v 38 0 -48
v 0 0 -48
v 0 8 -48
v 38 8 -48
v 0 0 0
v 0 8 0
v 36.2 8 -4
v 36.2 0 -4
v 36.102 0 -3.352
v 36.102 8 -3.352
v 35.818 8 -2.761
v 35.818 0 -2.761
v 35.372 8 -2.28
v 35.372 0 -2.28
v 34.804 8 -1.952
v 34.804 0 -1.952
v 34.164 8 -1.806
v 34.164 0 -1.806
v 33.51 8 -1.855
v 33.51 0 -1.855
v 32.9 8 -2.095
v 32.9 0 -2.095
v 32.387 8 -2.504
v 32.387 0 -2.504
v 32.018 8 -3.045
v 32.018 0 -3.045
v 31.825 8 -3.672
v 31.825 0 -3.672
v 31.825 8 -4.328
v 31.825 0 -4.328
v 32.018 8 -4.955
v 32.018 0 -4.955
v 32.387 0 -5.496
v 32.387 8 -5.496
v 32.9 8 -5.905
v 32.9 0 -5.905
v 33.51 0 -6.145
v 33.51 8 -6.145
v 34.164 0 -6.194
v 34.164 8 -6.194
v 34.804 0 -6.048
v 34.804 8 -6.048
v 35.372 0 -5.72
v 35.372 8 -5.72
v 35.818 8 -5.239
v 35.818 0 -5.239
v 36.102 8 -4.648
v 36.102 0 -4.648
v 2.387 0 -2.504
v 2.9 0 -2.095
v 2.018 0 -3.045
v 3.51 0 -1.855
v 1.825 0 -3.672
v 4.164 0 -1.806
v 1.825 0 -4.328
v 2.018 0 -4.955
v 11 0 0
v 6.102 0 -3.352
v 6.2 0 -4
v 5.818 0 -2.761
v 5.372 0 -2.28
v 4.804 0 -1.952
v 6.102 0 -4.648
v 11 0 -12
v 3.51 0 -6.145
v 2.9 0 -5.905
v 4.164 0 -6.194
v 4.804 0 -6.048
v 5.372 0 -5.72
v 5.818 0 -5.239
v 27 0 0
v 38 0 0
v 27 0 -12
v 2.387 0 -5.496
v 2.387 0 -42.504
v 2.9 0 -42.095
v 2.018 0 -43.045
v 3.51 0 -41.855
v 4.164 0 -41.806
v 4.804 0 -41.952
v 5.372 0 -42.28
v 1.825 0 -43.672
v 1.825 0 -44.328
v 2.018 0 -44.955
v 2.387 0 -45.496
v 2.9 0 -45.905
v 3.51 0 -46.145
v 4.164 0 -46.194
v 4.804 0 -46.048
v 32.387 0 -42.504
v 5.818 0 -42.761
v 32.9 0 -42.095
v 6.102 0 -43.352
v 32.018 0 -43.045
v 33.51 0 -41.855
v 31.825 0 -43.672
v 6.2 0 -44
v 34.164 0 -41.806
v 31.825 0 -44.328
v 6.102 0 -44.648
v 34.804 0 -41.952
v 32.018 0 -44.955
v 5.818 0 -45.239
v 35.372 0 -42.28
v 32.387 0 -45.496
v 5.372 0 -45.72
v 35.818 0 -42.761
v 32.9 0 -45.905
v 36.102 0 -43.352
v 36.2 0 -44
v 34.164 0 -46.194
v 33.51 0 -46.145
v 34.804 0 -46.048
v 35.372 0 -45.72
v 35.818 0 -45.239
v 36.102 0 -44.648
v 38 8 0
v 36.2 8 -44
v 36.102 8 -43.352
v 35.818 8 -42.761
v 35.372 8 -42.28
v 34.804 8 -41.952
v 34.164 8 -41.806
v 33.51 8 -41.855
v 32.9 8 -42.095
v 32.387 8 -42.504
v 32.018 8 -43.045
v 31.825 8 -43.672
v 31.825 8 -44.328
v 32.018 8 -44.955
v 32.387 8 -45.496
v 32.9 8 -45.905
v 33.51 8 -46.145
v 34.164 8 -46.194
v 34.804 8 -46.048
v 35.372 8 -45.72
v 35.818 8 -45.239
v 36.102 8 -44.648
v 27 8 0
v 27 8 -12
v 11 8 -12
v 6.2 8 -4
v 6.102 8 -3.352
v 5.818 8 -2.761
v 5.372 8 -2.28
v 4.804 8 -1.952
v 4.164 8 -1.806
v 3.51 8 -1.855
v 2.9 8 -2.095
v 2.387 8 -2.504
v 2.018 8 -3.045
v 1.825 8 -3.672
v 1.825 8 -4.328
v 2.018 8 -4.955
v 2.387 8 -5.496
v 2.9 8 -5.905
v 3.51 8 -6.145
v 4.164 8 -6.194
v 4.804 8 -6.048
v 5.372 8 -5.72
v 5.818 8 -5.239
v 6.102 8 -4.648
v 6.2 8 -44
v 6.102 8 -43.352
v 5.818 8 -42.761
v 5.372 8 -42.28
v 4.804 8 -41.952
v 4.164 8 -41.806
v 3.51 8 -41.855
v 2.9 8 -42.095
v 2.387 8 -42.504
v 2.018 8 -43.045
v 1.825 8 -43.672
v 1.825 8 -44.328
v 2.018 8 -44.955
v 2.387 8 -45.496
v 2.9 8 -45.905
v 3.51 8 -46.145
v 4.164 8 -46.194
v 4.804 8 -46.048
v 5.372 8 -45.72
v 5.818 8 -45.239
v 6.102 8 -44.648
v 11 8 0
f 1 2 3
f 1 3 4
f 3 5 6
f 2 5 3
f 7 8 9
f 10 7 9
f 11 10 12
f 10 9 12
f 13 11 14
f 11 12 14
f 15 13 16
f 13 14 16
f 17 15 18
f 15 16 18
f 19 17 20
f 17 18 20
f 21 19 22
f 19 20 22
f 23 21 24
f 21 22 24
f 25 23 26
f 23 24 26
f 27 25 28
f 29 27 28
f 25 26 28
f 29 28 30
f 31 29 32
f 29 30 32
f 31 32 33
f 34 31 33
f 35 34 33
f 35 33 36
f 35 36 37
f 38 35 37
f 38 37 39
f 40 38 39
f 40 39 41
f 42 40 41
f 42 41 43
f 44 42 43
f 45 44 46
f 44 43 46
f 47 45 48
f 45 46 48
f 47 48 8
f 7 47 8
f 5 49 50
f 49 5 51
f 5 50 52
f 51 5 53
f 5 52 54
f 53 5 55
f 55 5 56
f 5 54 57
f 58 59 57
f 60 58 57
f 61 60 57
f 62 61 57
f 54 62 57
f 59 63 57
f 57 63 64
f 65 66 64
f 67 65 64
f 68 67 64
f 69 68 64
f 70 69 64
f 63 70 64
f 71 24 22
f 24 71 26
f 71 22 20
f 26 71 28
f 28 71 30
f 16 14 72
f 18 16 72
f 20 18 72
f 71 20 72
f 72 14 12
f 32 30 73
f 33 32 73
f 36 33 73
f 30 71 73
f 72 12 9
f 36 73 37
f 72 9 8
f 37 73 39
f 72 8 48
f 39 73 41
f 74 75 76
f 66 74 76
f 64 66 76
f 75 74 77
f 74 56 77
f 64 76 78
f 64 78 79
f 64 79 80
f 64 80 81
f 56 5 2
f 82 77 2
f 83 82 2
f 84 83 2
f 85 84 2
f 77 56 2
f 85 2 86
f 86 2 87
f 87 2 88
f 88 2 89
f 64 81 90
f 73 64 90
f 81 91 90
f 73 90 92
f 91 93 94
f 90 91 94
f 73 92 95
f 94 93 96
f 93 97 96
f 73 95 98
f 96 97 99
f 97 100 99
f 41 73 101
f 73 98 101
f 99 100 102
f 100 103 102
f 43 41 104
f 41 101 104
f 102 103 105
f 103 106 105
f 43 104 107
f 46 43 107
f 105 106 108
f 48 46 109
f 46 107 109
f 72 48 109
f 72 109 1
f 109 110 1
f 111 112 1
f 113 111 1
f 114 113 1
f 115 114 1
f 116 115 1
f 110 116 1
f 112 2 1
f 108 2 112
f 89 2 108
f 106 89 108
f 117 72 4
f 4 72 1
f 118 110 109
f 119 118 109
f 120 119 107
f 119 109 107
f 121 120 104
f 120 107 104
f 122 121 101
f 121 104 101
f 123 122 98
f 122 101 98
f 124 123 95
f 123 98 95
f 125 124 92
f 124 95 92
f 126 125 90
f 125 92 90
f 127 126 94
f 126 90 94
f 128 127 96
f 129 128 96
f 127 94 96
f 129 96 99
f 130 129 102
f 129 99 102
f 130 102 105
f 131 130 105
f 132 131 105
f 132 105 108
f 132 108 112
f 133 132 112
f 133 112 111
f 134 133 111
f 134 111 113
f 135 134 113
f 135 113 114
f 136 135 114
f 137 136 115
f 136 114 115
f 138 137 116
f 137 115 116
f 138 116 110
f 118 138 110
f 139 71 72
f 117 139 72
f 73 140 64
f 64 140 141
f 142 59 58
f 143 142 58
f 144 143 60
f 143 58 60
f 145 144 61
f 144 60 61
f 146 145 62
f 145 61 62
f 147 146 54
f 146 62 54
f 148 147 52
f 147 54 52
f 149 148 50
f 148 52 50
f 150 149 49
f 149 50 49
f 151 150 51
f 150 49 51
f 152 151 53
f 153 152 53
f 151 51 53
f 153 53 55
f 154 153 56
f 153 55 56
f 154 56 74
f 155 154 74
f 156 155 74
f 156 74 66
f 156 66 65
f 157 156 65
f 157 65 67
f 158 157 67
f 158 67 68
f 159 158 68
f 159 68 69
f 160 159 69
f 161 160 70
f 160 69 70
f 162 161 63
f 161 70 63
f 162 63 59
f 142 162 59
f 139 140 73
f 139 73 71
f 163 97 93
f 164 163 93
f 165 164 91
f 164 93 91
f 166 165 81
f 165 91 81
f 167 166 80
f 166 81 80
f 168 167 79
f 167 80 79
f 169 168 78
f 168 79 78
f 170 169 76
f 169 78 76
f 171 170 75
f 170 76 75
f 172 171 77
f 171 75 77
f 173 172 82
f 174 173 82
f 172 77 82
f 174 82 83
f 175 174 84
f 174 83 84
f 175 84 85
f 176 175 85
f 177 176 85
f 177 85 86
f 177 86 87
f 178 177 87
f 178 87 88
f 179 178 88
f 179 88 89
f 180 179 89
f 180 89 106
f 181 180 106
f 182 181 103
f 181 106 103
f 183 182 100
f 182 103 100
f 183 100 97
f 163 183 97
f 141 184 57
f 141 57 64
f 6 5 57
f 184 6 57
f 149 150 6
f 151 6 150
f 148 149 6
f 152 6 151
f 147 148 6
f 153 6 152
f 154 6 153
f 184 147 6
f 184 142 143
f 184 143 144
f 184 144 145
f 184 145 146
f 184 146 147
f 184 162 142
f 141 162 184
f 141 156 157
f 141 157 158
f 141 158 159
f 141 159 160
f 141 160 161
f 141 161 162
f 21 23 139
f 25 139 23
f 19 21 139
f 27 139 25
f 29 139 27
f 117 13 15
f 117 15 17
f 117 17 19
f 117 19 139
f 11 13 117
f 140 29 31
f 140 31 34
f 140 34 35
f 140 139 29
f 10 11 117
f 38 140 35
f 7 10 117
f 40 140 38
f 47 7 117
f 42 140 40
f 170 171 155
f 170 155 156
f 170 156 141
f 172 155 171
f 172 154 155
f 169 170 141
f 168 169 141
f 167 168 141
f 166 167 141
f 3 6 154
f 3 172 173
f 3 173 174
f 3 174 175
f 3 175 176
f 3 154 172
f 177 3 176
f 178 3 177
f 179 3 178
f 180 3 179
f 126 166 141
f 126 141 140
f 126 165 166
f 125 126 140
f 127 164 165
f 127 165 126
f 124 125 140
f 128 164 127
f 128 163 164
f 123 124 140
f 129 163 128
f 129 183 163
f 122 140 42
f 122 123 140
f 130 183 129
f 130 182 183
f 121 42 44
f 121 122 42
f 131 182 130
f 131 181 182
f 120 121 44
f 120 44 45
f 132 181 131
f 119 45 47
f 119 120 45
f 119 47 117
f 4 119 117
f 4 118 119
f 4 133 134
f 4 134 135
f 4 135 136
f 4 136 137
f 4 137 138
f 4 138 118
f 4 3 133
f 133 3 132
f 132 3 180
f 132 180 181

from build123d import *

# Parameters (mm, degrees)
ESQUISSE1_W             = 38
ESQUISSE1_H             = 48
BOSS_EXTRU_1_DEPTH      = 8
ESQUISSE3_R             = 2.2
ENL_V_MAT_EXTRU_1_DEPTH = 8
ENL_V_MAT_EXTRU_2_DEPTH = 8


with BuildPart() as part:
    # Esquisse1 → Boss.-Extru.1 (new body)
    with BuildSketch(Plane(origin=(0, 0, 0), x_dir=(1, 0, 0), z_dir=(0, 1, 0))):
        with Locations((19, 24)):
            Rectangle(ESQUISSE1_W, ESQUISSE1_H)
    extrude(amount=BOSS_EXTRU_1_DEPTH)

    # Esquisse3 → Enlèv. mat.-Extru.1 (cut)
    with BuildSketch(Plane.XZ):
        with Locations((4, -4)):
            Circle(ESQUISSE3_R)
        with Locations((34, -4)):
            Circle(ESQUISSE3_R)
        with Locations((34, -44)):
            Circle(ESQUISSE3_R)
        with Locations((4, -44)):
            Circle(ESQUISSE3_R)
    extrude(amount=-ENL_V_MAT_EXTRU_1_DEPTH, mode=Mode.SUBTRACT)

    # Esquisse5 → Enlèv. mat.-Extru.2 (cut)
    with BuildSketch(Plane(origin=(0, 8, 0), x_dir=(1, 0, 0), z_dir=(0, 1, 0))):
        Polygon((19, 12), (27, 12), (27, 0), (11, 0), (11, 12), align=None)
    extrude(amount=-ENL_V_MAT_EXTRU_2_DEPTH, mode=Mode.SUBTRACT)


solid = part.part
